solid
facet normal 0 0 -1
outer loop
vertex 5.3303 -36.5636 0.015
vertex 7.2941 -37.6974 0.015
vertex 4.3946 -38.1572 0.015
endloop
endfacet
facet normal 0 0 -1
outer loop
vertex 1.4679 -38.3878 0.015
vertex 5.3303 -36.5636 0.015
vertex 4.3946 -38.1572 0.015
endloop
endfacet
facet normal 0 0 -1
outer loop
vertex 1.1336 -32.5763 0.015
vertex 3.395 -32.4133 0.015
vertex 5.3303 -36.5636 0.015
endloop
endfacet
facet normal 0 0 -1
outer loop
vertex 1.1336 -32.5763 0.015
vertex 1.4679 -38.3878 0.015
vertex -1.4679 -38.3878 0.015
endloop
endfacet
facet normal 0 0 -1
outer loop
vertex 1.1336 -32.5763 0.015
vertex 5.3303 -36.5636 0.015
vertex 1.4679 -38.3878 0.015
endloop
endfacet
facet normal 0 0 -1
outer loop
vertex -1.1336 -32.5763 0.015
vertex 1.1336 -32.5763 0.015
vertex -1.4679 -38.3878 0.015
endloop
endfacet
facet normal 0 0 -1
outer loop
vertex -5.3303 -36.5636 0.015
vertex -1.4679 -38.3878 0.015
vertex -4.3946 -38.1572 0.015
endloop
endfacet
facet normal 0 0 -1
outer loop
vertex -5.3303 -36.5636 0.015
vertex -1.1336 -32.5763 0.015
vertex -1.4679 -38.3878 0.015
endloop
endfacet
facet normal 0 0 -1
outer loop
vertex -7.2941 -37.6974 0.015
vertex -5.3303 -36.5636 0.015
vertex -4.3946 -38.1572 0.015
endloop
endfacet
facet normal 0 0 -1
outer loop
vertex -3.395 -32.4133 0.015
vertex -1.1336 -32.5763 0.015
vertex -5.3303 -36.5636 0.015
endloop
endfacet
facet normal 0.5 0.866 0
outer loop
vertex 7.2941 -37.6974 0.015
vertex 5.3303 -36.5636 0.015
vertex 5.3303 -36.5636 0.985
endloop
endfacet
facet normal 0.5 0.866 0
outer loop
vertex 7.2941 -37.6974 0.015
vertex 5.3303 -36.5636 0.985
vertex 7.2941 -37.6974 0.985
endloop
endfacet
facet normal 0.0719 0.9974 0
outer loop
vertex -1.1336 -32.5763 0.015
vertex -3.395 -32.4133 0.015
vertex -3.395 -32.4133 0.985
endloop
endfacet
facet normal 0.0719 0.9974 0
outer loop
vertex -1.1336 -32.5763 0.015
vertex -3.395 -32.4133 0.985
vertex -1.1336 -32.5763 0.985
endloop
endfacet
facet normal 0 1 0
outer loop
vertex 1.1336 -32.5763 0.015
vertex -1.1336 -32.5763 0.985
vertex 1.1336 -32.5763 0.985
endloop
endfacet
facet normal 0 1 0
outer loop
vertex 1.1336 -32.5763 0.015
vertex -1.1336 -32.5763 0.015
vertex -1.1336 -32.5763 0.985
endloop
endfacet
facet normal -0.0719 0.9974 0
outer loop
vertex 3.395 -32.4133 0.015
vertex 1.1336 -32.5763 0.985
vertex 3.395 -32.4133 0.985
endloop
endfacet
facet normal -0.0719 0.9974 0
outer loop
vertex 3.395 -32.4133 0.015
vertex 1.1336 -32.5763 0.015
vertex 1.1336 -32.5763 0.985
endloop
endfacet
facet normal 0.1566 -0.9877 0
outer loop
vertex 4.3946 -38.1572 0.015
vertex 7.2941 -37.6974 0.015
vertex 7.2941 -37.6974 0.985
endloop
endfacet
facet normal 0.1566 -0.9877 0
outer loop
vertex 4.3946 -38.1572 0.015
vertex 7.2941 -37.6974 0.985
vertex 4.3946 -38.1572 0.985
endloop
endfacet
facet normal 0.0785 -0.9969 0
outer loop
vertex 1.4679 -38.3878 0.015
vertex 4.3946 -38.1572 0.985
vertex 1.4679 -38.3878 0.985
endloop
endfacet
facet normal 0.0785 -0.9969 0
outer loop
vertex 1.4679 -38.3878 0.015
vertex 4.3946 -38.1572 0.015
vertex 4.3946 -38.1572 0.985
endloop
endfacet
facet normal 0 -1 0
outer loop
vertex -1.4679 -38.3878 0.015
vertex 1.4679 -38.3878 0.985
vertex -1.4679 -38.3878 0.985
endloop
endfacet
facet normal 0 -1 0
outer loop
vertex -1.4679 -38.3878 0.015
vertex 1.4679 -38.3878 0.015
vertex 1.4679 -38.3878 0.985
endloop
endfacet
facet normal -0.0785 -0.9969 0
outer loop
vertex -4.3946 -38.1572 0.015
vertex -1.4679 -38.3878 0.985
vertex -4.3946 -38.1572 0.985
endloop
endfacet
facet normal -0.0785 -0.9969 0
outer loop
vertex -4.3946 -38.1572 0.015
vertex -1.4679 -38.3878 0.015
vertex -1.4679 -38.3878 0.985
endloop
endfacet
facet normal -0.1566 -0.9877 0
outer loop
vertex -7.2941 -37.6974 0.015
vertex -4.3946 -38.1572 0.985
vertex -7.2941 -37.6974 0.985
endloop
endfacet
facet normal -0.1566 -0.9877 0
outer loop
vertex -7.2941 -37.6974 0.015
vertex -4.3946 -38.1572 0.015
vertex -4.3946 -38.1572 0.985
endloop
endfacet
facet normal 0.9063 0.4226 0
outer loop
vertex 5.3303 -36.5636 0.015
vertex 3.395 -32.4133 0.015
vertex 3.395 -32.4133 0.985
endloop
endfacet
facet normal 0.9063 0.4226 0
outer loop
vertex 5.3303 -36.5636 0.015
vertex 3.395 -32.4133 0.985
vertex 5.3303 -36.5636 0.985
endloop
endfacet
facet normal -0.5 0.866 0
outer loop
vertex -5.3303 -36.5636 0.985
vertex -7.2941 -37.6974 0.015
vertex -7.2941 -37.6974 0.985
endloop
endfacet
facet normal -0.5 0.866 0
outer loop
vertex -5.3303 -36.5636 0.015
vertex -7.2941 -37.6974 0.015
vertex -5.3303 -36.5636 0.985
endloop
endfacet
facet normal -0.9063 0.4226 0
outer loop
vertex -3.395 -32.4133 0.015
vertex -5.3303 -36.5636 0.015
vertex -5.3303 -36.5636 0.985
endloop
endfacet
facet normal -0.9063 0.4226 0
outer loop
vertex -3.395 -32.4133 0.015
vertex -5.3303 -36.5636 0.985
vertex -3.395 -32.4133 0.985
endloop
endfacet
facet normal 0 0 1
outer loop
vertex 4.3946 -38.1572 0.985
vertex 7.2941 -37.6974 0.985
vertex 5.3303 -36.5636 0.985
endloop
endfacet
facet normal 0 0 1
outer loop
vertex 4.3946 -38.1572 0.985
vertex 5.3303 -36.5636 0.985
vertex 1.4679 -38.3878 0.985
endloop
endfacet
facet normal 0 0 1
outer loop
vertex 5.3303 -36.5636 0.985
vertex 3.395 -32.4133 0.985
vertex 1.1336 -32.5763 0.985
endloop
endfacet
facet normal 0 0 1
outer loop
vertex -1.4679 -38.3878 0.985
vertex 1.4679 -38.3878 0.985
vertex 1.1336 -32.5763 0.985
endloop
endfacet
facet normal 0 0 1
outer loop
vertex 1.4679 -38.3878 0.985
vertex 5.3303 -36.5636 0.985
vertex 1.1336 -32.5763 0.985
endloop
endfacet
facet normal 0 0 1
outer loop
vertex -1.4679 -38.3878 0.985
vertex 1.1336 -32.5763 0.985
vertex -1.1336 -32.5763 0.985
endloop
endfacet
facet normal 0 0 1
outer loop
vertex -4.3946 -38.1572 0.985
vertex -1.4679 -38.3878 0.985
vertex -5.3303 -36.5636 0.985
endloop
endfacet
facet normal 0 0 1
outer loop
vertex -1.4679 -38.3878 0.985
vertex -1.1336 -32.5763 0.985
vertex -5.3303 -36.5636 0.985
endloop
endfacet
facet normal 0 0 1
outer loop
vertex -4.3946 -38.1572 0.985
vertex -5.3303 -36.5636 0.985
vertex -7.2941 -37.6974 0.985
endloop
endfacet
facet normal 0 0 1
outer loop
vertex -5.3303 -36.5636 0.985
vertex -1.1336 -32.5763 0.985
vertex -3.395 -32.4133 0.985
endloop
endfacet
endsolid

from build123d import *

# Parameters (mm, degrees)
BOSS_EXTRUDE1_DEPTH = 1
SCALE1_SCALE        = 0.97


with BuildPart() as part:
    # Sketch1 → Boss-Extrude1 (new body)
    with BuildSketch(Plane.XY):
        with BuildLine():
            Line((-5.495175992, -36.589657566), (-3.5, -32.310988843))
            ThreePointArc((-3.5, -32.310988843), (0, -32.5), (3.5, -32.310988843))
            Line((3.5, -32.310988843), (5.495175992, -36.589657566))
            Line((5.495175992, -36.589657566), (7.519674459, -37.758502301))
            ThreePointArc((7.519674459, -37.758502301), (0, -38.5), (-7.519674459, -37.758502301))
            Line((-7.519674459, -37.758502301), (-5.495175992, -36.589657566))
        make_face()
    extrude(amount=BOSS_EXTRUDE1_DEPTH)


with BuildPart() as part_1:
    # Scale1: scaled about (0, -35.722317189, 0.5)
    add(part.part.scale(SCALE1_SCALE).moved(Location((0, -1.071669516, 0.015))))


solid = part_1.part
